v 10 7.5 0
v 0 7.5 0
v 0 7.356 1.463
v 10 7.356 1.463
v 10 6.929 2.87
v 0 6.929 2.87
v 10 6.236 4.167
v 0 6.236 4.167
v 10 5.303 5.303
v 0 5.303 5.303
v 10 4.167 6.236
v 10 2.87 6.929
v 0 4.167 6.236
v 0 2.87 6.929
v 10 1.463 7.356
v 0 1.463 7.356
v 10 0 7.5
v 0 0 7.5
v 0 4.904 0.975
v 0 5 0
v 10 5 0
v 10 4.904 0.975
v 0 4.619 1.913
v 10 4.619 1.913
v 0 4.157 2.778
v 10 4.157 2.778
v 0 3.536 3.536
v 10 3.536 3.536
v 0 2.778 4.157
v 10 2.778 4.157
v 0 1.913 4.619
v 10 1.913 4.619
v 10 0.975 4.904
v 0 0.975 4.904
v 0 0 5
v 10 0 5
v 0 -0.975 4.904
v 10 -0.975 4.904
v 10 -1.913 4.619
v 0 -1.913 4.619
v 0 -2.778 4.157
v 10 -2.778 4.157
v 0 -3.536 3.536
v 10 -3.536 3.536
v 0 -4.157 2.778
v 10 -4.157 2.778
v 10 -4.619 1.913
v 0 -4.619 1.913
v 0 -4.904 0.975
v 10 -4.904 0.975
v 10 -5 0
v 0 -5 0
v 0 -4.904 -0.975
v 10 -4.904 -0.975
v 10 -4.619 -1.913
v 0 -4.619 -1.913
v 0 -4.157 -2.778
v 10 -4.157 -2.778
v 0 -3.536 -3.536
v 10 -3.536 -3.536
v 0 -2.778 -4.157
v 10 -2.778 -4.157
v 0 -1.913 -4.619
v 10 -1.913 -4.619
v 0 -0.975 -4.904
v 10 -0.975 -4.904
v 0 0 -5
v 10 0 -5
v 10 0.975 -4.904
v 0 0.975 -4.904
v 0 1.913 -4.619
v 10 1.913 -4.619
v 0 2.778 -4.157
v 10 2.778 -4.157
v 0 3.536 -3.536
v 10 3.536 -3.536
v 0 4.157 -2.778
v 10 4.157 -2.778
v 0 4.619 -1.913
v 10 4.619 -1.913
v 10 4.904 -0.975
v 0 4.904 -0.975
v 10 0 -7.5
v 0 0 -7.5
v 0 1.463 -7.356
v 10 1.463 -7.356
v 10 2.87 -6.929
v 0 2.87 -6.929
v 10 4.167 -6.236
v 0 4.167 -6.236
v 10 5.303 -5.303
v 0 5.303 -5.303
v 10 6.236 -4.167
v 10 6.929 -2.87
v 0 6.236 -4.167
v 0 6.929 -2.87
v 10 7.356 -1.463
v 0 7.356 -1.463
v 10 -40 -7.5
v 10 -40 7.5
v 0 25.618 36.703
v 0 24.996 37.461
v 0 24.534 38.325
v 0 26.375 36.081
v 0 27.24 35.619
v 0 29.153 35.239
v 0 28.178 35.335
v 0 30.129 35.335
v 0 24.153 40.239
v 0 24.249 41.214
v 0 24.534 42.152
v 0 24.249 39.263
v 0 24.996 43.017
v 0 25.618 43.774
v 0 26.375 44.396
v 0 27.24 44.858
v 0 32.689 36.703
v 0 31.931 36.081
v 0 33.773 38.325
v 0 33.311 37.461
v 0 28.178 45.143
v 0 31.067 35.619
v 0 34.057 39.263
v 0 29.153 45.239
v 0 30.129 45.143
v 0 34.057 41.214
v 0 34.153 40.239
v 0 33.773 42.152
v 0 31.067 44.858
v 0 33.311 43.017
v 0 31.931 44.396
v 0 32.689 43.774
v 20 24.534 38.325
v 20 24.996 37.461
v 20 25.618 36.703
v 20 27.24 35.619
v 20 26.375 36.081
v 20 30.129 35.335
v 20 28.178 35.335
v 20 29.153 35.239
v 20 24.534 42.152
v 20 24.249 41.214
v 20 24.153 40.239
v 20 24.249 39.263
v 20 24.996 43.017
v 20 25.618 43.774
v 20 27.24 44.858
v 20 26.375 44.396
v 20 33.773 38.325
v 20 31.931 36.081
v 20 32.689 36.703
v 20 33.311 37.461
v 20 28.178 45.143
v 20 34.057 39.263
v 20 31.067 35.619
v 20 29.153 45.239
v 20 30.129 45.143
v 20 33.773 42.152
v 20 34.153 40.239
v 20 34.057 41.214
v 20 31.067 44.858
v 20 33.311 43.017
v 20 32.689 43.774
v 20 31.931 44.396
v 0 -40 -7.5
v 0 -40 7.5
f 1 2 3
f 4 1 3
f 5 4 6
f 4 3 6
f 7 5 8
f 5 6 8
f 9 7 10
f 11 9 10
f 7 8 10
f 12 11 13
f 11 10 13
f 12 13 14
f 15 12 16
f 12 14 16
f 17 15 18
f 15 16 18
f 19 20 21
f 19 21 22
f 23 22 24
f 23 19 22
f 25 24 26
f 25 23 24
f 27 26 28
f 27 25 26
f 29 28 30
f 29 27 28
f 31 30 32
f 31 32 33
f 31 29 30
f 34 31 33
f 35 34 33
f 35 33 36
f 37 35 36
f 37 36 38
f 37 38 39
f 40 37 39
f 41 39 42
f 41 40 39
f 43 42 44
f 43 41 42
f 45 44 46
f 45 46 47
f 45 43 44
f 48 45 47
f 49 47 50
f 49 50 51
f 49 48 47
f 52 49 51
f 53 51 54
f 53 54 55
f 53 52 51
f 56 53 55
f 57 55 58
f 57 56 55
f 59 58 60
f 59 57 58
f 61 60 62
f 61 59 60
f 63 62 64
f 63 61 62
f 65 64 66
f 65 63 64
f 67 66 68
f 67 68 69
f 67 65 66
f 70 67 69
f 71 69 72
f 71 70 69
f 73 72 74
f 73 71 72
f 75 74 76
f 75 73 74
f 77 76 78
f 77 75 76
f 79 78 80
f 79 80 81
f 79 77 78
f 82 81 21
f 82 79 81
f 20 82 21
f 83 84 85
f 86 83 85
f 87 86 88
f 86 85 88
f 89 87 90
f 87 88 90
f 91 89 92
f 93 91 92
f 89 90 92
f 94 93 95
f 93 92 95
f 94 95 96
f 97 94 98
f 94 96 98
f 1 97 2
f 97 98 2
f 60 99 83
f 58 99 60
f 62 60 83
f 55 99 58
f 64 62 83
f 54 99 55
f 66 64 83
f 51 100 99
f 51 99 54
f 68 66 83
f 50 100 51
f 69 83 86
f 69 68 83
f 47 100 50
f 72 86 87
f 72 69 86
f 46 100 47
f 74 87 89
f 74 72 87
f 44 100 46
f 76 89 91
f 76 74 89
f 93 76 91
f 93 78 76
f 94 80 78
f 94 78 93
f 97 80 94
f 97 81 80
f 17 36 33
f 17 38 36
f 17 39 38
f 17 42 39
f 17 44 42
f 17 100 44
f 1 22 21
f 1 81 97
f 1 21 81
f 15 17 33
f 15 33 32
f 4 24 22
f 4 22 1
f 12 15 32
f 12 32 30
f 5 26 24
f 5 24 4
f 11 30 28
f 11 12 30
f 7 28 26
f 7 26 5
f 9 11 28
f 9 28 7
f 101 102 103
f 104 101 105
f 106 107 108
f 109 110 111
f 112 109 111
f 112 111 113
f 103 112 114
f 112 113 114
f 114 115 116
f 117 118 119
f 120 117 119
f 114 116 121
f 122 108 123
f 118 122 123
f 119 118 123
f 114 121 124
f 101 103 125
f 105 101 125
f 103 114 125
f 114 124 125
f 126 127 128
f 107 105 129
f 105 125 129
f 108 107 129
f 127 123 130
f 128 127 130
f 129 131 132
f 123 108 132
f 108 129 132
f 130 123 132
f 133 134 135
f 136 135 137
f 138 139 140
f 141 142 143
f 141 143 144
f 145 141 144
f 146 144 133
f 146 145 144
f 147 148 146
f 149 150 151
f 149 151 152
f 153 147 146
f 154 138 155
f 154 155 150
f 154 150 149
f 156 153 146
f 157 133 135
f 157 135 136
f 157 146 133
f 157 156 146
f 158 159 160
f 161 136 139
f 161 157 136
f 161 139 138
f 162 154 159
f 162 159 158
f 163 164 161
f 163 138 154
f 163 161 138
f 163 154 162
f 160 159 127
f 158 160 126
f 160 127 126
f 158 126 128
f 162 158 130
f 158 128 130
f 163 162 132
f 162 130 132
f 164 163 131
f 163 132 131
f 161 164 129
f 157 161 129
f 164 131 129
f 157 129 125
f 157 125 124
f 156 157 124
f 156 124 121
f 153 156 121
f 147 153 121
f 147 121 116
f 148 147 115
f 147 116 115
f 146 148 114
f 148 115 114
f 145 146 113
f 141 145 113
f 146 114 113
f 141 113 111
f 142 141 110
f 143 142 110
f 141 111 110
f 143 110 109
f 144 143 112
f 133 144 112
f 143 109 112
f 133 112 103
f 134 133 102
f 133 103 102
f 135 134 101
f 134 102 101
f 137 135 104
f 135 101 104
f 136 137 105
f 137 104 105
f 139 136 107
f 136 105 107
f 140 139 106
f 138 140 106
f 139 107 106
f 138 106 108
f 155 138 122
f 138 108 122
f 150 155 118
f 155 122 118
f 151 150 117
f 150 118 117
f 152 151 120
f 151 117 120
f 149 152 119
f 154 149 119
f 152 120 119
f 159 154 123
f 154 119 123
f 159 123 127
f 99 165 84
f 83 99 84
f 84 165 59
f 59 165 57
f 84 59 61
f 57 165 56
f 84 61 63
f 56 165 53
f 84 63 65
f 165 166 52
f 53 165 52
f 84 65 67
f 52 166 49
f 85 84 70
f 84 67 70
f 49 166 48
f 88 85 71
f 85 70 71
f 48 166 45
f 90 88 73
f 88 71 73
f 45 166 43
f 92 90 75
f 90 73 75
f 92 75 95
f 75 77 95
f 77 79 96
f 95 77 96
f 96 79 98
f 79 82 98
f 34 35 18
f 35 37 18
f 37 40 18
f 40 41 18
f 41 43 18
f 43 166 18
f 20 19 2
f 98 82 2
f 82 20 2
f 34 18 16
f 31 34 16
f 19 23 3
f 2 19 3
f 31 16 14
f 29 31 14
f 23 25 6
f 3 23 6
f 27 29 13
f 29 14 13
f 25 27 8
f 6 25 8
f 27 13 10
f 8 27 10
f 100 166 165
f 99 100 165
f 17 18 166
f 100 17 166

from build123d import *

# Parameters (mm, degrees)
F0_R     = 5
F1_DEPTH = 10
F2_R     = 5
F3_DEPTH = 20


with BuildPart() as f1:
    # F0 (on Right) → F1 (new body)
    with BuildSketch(Plane.YZ):
        with BuildLine():
            ThreePointArc((0, -7.5), (5.303301, -5.303301), (7.5, 0))
            ThreePointArc((7.5, 0), (5.303301, 5.303301), (0, 7.5))
            ThreePointArc((0, 7.5), (-7.5, 0), (0, -7.5))
        make_face()
        Circle(F0_R, mode=Mode.SUBTRACT)
        with BuildLine():
            ThreePointArc((0, -7.5), (-7.5, 0), (0, 7.5))
            Line((0, 7.5), (-40, 7.5))
            Line((-40, 7.5), (-40, -7.5))
            Line((-40, -7.5), (0, -7.5))
        make_face()
    extrude(amount=F1_DEPTH)


with BuildPart() as f3:
    # F2 (on Right) → F3 (new body)
    with BuildSketch(Plane.YZ):
        with Locations((29.153338, 40.238805)):
            Circle(F2_R)
    extrude(amount=F3_DEPTH)


solid = Compound([f1.part, f3.part])
